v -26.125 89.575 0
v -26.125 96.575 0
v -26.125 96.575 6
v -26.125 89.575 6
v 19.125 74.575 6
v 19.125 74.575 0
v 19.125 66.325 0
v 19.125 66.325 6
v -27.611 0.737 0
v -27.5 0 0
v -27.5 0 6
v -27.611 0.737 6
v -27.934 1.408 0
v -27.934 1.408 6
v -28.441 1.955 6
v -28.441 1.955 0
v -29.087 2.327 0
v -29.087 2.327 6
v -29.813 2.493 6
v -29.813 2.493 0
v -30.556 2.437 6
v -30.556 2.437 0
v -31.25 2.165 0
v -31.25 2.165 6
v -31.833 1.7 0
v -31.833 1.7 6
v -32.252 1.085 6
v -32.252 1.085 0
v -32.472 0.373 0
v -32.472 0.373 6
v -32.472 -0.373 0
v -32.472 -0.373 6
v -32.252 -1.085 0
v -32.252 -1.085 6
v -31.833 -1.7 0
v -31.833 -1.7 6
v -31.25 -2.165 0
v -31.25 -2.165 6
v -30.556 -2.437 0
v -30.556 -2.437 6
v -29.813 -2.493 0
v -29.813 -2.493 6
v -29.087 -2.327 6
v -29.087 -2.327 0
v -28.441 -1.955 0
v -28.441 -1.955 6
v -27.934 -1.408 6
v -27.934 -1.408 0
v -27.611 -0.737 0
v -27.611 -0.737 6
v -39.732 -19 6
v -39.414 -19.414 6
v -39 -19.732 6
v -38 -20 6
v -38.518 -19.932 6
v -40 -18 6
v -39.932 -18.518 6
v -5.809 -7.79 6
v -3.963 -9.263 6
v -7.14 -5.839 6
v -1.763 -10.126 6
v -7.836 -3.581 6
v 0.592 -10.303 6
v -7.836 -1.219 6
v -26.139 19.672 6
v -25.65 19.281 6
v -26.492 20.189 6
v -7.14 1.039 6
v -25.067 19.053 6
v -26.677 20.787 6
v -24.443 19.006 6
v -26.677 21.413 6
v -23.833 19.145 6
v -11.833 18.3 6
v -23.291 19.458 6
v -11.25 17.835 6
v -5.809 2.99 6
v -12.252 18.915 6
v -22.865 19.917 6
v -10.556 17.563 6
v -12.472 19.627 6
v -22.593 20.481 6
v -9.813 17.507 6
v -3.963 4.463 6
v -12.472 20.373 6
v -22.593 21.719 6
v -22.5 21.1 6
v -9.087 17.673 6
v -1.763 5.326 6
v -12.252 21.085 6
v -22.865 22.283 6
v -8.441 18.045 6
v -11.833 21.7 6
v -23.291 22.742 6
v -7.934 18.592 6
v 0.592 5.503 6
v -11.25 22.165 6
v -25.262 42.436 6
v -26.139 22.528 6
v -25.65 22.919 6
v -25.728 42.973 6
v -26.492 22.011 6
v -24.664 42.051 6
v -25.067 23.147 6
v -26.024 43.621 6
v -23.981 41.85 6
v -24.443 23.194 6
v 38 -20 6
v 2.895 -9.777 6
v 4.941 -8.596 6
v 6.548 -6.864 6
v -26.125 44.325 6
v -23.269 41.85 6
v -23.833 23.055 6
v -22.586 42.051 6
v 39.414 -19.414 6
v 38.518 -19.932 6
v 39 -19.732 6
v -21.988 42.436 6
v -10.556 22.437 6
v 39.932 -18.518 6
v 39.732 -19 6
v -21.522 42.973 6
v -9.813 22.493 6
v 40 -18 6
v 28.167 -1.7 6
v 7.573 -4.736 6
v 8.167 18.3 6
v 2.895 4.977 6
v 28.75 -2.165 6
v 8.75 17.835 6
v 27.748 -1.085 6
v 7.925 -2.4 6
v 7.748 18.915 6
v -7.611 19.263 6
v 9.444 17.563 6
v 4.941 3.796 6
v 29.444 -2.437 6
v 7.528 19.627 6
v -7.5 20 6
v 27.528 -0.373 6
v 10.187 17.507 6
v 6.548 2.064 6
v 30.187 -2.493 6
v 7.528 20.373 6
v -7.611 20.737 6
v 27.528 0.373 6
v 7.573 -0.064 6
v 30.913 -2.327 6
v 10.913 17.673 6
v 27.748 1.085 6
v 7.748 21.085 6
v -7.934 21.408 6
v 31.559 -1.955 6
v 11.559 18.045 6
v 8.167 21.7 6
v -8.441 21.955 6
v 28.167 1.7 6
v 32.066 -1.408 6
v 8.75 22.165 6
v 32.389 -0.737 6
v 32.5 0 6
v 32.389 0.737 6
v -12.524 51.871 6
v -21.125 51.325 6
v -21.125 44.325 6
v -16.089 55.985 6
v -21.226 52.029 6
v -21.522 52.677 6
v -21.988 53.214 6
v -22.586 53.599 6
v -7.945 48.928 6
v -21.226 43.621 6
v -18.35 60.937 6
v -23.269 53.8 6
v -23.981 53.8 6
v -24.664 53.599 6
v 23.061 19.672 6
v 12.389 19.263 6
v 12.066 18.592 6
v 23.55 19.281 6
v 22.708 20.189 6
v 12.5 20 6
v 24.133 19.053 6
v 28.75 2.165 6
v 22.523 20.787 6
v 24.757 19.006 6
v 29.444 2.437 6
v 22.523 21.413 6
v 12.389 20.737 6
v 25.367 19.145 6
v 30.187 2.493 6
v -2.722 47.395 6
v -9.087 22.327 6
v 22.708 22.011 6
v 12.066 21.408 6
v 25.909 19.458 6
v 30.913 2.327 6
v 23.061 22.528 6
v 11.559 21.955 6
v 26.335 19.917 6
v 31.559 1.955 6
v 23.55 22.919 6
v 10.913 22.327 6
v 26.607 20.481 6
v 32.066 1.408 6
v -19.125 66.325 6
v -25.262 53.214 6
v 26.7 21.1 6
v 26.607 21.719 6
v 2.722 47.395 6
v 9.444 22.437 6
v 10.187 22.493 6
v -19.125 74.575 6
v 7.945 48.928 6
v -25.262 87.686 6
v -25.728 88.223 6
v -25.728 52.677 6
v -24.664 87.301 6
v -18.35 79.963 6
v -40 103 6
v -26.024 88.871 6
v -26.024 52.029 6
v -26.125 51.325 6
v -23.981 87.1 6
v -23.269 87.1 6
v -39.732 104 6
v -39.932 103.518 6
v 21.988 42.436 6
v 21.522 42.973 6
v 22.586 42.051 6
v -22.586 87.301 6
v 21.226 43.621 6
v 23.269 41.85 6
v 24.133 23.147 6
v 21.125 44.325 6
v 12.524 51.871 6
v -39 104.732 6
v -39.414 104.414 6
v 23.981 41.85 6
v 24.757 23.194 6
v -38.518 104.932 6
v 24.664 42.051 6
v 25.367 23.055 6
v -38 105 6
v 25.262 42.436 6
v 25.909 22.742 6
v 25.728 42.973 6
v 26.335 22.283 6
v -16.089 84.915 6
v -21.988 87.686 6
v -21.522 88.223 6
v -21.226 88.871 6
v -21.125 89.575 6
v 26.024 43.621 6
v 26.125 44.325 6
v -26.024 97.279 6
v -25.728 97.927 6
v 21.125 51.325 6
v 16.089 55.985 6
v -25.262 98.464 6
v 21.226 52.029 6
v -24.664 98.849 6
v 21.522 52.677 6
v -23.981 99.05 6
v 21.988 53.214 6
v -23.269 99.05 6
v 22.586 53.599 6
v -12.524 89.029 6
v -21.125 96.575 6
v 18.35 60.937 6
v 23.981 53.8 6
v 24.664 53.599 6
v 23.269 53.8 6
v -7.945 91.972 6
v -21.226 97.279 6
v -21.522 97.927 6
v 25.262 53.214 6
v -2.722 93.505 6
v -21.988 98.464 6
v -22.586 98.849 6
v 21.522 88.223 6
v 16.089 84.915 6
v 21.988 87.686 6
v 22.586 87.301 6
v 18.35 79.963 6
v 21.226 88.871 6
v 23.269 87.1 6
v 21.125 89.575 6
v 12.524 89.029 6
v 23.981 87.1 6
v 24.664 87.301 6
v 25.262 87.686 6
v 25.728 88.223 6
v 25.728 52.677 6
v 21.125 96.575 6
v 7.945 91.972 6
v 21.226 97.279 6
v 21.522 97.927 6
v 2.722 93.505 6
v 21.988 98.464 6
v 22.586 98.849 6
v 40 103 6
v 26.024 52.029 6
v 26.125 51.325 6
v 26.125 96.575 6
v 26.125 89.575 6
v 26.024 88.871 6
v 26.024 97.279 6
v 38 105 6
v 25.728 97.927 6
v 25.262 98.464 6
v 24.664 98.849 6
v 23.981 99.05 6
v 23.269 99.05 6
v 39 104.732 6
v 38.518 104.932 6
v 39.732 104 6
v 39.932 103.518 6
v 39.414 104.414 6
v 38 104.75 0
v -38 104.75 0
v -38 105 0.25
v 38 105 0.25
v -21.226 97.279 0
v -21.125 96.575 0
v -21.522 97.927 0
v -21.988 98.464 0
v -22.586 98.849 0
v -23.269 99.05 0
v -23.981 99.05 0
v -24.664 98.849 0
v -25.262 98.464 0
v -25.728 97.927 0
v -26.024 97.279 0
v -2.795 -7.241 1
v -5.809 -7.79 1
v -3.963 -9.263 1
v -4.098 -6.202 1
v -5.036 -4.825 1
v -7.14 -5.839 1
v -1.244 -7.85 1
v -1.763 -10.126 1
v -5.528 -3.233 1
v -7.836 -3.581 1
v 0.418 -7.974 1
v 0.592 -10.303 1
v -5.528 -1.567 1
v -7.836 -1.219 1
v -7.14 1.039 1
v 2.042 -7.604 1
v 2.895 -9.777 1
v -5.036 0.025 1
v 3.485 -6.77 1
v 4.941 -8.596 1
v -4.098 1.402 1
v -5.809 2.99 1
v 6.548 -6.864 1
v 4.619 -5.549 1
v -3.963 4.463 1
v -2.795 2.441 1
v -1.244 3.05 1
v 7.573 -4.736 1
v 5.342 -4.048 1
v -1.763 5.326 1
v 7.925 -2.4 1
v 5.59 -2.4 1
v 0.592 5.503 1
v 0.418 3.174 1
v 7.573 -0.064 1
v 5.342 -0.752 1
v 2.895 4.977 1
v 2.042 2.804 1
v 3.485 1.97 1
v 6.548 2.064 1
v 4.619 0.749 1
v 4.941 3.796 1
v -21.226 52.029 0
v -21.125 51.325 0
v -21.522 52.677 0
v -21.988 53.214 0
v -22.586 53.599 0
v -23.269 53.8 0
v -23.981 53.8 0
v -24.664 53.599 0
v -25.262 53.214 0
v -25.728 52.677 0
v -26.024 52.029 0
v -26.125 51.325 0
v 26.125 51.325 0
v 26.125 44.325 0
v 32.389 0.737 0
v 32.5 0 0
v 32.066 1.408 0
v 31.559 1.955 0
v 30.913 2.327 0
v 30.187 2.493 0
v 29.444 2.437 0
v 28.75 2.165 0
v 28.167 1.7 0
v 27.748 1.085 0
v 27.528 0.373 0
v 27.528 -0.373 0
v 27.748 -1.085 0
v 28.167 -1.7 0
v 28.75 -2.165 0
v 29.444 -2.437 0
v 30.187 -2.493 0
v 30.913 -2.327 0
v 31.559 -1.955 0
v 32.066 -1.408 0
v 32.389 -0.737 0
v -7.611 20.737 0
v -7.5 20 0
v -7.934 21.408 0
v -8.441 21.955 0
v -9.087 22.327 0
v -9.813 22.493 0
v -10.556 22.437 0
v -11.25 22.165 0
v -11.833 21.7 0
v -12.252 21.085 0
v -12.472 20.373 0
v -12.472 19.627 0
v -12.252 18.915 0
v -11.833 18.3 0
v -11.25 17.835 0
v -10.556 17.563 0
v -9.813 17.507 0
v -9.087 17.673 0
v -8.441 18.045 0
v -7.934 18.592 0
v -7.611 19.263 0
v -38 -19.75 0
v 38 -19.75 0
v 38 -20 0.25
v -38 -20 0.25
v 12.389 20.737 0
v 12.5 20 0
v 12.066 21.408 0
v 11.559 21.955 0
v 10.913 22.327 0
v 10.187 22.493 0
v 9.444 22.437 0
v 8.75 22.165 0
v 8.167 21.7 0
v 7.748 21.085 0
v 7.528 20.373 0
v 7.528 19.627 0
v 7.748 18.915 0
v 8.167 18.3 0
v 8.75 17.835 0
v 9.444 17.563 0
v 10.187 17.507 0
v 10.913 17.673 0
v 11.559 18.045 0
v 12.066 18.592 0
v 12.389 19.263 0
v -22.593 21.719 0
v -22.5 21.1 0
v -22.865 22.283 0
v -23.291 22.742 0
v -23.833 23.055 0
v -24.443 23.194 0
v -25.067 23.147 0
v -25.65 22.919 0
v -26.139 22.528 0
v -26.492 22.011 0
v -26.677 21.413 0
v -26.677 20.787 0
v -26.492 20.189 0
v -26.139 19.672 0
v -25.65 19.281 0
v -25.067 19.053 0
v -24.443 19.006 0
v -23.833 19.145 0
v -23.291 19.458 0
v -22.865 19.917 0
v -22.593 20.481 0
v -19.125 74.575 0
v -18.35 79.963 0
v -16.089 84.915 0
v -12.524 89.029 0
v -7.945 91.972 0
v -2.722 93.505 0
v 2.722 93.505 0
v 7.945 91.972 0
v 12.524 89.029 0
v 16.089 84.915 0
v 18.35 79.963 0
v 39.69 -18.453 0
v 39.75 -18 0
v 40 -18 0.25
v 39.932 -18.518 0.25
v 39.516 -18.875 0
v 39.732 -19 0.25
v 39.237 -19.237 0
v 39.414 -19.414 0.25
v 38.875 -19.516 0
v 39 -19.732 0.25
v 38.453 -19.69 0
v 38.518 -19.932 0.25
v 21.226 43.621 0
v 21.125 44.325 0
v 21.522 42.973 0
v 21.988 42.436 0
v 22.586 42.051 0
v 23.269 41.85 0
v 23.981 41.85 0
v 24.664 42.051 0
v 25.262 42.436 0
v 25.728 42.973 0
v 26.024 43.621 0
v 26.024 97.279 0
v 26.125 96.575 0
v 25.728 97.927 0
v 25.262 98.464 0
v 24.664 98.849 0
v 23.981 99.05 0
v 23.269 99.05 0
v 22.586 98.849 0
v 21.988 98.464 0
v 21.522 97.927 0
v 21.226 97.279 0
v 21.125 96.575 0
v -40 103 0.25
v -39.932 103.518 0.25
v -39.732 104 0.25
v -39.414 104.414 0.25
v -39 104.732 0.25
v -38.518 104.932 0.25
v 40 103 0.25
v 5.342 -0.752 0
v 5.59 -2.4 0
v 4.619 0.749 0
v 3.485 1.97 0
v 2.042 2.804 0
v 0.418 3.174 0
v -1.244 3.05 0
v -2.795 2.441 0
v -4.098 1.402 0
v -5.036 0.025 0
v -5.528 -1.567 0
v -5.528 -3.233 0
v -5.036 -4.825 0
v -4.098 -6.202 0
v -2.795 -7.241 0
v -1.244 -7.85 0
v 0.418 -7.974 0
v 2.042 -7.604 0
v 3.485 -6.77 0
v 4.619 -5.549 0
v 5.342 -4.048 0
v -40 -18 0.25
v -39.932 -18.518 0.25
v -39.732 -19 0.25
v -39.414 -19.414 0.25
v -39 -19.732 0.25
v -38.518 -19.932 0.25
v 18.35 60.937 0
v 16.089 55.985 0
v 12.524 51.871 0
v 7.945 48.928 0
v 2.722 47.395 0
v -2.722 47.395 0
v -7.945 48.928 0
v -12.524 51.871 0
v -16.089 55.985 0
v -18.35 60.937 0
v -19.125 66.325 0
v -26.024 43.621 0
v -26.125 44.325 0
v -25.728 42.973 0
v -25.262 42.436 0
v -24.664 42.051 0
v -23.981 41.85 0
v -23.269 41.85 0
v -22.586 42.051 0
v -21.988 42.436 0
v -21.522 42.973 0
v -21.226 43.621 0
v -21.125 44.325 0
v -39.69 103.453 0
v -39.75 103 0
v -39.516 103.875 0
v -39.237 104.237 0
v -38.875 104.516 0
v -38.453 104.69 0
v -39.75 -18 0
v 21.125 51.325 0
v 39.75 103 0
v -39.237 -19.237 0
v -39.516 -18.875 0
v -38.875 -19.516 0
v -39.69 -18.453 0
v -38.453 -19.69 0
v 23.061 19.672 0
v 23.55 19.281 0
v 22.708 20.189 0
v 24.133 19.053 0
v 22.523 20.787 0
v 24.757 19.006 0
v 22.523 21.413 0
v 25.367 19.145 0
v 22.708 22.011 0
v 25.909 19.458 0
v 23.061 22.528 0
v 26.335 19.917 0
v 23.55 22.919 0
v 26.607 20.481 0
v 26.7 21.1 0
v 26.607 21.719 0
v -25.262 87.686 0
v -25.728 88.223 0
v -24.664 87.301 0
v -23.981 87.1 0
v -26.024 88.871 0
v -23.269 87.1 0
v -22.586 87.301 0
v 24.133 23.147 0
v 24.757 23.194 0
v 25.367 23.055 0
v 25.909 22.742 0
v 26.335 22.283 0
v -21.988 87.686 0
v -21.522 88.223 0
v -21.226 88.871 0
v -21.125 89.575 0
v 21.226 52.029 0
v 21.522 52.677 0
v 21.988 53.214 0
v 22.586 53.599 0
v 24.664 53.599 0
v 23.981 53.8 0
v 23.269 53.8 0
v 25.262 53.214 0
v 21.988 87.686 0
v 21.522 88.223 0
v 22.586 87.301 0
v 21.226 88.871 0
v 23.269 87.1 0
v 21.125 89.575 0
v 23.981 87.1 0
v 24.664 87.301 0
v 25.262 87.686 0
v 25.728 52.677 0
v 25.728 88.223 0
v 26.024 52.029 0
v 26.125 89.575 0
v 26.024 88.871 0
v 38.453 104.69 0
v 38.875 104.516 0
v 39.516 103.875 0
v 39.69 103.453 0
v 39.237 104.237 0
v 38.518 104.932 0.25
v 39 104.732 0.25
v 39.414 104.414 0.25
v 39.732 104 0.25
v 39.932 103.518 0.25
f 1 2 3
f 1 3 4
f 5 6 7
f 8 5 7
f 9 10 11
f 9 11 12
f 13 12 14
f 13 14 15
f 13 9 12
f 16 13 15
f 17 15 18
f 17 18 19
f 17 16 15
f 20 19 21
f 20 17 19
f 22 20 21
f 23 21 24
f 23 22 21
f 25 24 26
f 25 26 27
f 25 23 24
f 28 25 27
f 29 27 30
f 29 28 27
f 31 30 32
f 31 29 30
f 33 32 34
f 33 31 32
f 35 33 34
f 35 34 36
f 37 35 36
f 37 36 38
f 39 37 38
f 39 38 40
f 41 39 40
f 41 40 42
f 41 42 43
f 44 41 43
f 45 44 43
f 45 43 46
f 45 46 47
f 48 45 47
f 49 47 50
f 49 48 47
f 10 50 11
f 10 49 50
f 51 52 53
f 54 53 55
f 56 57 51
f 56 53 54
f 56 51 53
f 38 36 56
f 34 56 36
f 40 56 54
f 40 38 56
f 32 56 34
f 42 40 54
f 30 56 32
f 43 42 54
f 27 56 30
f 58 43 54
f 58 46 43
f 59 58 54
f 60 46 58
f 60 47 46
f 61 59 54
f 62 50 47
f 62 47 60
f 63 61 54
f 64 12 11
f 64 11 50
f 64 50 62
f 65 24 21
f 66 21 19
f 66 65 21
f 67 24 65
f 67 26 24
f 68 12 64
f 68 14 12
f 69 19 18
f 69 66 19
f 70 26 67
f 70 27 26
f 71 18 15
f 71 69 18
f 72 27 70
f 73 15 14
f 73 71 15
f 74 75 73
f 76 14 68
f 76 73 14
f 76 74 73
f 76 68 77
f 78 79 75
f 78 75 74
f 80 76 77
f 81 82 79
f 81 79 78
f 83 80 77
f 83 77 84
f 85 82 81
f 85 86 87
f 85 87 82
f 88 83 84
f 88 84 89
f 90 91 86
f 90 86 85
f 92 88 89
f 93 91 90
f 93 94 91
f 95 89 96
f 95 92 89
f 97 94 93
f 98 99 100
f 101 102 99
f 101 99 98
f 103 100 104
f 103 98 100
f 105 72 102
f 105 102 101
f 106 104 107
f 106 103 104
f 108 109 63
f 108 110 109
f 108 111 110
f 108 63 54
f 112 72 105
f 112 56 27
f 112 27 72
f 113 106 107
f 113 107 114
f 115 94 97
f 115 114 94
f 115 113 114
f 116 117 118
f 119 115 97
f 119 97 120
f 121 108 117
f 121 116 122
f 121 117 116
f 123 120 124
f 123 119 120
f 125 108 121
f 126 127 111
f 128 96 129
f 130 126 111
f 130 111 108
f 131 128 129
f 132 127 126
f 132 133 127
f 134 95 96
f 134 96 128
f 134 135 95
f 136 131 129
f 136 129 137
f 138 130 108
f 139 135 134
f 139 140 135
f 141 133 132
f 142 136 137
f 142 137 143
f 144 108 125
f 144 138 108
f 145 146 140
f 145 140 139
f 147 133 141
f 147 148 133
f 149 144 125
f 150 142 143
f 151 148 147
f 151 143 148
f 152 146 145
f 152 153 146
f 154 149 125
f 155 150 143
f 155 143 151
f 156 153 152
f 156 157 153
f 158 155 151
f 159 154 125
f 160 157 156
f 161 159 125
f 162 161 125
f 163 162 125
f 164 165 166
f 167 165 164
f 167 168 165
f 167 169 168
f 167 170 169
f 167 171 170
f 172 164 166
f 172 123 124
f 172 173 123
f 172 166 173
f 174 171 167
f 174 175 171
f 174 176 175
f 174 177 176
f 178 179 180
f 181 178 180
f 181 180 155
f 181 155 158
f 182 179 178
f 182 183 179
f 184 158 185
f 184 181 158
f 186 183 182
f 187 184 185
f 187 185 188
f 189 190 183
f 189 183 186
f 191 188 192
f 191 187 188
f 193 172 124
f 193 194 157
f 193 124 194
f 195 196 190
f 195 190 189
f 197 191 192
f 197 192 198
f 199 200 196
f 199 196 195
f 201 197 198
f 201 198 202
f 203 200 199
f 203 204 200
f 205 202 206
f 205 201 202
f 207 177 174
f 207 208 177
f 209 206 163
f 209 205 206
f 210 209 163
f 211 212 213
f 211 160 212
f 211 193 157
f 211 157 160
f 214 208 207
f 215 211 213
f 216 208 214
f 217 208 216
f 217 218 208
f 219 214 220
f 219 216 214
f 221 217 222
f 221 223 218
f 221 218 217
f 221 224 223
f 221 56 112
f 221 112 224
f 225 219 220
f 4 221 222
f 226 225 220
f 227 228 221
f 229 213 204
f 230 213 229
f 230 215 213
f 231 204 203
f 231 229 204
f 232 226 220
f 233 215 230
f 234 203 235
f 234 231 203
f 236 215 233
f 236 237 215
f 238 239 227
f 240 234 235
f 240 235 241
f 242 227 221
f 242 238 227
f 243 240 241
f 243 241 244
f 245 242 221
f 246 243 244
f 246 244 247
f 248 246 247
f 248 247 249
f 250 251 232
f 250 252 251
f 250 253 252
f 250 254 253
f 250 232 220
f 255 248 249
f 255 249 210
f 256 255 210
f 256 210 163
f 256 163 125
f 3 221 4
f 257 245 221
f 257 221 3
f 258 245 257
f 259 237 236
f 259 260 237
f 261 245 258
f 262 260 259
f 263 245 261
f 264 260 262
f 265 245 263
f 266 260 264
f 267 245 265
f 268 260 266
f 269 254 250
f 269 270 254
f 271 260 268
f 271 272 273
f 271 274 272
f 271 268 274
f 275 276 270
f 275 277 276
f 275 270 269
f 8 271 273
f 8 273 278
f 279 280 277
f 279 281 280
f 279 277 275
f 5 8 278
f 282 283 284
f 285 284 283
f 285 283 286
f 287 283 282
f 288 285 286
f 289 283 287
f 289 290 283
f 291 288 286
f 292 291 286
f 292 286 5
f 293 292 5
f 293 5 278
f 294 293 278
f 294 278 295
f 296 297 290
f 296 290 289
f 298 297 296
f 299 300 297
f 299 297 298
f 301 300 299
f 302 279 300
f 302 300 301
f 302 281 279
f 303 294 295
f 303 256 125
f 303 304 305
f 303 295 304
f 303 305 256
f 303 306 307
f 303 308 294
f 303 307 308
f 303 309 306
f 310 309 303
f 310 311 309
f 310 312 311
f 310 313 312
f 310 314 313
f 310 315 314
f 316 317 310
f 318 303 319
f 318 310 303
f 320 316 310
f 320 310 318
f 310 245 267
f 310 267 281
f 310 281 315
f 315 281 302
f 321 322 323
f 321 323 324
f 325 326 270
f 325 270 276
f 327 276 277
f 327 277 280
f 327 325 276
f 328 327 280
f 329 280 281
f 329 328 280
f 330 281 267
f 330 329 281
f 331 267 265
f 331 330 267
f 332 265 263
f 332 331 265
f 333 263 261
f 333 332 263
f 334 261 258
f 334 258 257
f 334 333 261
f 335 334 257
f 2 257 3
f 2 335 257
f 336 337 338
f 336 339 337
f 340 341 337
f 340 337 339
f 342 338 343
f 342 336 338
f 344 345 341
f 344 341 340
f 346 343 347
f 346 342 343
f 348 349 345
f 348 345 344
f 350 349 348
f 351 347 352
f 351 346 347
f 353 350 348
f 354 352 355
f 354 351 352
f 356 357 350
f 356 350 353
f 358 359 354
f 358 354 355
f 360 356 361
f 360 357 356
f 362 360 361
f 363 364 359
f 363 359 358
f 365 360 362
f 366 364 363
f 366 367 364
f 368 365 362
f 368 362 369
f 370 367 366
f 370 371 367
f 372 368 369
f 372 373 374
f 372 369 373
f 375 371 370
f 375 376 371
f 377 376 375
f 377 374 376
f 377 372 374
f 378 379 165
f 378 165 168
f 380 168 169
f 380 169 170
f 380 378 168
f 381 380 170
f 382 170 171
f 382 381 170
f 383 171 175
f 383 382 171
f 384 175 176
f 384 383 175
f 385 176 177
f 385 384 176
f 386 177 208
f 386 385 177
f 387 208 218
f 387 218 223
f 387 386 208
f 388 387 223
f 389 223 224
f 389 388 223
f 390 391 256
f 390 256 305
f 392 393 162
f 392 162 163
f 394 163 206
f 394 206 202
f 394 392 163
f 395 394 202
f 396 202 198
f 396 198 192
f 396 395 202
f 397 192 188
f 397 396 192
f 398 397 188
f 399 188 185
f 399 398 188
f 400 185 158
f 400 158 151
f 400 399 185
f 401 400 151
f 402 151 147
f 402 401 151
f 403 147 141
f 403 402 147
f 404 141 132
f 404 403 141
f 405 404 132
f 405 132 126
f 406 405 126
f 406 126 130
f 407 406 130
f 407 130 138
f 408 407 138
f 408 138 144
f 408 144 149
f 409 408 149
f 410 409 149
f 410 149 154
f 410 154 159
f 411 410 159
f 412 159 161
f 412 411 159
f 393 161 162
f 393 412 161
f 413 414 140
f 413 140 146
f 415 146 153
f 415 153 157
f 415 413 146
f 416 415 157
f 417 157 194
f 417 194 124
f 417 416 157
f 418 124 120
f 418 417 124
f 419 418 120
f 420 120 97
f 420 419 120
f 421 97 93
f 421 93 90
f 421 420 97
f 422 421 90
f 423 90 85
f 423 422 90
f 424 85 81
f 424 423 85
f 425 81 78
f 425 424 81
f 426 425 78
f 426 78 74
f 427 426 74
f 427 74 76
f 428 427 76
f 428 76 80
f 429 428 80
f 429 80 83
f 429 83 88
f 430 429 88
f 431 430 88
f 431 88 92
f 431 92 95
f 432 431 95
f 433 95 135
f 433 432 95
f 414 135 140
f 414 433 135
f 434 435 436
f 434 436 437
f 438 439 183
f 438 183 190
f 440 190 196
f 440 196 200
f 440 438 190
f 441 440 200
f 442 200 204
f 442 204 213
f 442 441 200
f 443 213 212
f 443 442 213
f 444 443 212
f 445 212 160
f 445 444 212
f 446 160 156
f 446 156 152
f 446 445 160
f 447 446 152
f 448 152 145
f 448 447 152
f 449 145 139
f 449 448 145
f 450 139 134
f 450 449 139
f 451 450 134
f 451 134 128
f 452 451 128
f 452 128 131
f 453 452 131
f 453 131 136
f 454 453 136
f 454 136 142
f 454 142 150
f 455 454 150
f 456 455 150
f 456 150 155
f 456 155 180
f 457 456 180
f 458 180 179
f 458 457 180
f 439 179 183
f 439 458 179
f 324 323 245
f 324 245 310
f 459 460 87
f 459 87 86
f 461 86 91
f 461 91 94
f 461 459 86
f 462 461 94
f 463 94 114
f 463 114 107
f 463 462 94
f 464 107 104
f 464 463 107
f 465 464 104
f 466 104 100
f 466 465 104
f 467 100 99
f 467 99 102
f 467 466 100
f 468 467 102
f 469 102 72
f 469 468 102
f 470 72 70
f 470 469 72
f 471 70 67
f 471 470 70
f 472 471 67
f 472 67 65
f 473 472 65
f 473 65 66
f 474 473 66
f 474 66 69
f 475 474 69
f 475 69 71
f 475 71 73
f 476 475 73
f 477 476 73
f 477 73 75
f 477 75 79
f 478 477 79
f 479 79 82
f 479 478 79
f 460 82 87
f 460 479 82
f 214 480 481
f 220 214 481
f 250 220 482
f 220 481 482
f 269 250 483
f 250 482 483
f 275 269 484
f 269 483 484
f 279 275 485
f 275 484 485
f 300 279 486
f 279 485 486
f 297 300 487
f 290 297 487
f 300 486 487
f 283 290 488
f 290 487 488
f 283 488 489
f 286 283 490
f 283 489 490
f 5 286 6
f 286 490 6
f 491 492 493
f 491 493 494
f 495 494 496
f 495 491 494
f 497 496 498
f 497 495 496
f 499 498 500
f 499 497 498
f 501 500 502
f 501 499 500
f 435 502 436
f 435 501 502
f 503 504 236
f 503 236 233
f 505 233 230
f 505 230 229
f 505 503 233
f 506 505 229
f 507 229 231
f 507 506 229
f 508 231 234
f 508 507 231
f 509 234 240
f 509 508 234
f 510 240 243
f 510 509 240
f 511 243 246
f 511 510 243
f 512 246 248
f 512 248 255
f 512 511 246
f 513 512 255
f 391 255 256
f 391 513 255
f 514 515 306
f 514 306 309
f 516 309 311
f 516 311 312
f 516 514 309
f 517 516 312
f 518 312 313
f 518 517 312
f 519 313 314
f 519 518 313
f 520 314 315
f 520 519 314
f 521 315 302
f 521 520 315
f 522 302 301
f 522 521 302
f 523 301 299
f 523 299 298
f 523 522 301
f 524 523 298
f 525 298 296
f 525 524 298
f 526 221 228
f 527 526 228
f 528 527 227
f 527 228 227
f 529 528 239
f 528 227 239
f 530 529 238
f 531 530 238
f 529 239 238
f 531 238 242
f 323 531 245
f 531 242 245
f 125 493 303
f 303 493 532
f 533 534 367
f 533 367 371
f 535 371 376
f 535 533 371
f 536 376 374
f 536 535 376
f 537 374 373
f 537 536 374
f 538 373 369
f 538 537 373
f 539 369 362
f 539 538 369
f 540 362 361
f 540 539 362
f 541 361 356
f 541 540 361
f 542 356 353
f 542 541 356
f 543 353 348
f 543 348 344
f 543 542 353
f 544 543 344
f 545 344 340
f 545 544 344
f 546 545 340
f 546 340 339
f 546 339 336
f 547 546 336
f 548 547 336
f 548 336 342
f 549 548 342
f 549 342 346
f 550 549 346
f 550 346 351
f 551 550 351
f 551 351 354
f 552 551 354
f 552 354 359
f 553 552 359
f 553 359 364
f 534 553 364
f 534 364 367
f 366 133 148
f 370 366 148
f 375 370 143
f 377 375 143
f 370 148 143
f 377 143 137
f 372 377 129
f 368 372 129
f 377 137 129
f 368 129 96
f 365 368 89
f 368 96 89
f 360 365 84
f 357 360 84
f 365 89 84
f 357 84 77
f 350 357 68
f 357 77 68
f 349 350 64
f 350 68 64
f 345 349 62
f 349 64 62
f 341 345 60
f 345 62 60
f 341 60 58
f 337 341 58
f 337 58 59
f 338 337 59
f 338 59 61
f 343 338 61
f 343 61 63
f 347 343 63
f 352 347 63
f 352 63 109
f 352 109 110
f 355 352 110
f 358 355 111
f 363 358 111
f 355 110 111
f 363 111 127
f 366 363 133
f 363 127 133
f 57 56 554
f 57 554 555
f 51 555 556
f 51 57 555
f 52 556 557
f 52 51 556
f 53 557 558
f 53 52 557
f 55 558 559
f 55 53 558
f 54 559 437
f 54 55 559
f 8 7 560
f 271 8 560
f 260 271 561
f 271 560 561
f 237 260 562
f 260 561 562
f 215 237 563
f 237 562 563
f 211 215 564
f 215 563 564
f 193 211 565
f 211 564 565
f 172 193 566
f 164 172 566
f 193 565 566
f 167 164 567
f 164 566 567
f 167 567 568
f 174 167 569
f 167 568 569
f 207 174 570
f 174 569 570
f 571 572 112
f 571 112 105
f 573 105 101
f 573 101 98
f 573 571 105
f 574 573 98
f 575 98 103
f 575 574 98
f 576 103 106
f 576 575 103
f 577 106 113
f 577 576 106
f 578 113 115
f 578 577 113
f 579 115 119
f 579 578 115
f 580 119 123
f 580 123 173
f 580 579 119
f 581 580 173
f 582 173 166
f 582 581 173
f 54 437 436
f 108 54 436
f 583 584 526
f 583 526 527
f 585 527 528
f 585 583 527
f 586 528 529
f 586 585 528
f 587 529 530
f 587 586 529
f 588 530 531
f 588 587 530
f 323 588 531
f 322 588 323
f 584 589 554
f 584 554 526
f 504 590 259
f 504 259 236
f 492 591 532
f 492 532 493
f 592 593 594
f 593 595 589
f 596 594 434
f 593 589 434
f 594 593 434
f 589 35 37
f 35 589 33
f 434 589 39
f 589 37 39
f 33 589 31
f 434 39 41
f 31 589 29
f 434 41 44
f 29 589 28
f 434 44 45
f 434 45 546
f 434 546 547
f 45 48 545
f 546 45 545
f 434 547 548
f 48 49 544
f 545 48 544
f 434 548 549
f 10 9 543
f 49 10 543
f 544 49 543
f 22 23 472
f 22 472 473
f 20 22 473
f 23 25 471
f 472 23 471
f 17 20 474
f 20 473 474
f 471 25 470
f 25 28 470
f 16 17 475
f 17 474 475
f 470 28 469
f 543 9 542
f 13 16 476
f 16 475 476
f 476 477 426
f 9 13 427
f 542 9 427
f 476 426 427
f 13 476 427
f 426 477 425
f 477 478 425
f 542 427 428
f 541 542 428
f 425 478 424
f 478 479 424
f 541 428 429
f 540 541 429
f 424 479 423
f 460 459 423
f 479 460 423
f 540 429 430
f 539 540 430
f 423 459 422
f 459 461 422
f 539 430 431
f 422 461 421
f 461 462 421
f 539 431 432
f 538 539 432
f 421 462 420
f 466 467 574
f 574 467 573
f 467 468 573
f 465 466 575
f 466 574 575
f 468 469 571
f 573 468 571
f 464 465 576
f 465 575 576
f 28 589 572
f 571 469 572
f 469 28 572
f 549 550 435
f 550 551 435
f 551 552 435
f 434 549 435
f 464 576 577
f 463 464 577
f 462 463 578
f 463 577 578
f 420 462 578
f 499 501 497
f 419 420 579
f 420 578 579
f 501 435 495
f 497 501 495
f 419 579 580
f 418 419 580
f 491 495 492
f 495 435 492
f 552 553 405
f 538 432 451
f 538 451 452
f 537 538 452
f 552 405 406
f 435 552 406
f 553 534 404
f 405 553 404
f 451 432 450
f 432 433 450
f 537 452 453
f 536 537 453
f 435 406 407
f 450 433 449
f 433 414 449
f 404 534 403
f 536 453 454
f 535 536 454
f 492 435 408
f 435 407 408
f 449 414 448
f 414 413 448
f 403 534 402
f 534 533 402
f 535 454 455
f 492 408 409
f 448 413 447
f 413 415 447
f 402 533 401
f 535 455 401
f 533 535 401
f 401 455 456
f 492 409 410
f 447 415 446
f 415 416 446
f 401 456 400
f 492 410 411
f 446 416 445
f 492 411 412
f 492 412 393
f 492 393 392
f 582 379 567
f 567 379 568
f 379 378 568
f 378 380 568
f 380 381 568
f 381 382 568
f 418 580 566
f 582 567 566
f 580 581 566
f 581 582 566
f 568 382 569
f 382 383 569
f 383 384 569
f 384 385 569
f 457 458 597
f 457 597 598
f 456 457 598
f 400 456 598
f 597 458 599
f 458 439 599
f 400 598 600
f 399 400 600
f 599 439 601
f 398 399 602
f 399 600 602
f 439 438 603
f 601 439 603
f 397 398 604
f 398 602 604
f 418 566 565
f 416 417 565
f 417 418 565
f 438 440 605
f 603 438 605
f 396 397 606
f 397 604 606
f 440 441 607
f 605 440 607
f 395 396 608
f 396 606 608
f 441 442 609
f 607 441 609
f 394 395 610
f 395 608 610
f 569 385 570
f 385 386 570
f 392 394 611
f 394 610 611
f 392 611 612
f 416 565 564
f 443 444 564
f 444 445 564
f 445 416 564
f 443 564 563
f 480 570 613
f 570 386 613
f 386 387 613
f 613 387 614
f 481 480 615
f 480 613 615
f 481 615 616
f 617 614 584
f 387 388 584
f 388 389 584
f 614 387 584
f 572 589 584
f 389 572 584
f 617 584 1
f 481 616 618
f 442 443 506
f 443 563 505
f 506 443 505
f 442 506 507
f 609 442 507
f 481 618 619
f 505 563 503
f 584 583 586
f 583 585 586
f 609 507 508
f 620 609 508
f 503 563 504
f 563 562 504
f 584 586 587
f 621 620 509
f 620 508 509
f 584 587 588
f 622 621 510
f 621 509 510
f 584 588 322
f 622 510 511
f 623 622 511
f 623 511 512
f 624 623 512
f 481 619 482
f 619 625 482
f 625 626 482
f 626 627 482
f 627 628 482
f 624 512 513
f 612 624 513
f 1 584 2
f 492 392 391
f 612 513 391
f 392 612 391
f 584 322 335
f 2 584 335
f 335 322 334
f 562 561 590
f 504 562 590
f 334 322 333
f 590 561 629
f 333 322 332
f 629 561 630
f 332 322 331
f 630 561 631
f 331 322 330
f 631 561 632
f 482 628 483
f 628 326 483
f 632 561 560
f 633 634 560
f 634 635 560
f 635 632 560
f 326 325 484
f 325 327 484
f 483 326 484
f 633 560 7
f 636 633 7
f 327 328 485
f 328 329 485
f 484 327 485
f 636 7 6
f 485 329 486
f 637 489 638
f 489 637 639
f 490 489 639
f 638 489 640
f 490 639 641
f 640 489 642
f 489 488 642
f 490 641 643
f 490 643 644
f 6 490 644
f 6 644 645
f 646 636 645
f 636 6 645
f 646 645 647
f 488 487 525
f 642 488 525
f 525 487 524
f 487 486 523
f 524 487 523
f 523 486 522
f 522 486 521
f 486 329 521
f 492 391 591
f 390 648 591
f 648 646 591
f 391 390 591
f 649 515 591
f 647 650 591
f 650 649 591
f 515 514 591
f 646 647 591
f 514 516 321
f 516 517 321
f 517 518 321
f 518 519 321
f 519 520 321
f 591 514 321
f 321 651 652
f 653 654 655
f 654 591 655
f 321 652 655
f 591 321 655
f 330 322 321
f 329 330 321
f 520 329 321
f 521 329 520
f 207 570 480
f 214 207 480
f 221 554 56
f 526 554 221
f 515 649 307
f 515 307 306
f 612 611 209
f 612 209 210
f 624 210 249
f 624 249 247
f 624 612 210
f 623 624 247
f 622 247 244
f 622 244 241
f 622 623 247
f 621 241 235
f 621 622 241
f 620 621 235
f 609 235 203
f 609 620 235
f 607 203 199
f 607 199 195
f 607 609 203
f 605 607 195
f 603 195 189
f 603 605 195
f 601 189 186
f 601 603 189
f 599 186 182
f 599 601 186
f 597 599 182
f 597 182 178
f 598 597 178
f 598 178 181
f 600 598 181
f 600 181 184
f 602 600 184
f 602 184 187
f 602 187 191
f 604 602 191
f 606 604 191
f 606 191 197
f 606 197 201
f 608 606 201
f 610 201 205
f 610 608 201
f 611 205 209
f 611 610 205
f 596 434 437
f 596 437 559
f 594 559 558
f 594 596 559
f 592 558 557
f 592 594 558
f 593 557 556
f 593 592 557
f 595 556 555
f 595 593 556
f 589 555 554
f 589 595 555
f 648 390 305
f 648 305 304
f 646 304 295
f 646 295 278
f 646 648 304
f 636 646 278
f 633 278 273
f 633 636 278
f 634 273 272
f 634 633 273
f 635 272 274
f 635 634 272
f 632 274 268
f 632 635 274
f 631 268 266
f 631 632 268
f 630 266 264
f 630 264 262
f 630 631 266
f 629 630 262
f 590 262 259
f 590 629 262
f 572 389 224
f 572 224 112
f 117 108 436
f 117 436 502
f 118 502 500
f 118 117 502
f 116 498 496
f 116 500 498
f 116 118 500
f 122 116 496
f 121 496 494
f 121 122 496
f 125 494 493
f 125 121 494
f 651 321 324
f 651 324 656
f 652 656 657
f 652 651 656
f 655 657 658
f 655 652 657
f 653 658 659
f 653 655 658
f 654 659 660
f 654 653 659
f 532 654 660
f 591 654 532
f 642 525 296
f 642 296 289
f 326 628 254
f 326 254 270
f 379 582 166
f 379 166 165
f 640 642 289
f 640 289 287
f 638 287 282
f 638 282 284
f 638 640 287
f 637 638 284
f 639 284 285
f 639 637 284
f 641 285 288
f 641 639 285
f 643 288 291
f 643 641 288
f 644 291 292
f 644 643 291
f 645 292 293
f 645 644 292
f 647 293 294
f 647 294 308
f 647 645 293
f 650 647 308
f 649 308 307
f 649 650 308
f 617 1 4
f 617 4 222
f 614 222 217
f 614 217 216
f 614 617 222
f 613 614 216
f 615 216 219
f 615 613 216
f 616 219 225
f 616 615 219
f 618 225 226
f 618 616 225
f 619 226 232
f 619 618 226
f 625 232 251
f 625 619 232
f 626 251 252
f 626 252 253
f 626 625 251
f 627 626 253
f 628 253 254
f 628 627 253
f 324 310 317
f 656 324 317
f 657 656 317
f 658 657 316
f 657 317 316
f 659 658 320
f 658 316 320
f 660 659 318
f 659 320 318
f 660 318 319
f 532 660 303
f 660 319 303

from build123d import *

# Parameters (mm, degrees)
F0_W     = 80
F0_H     = 125
F0_R     = 2.5
F0_R_2   = 2.1
F0_R_3   = 5.59
F1_DEPTH = 6
F3_DEPTH = 6
F4_R     = 2
F5_SIZE  = 0.25
F6_R     = 7.925
F6_R_2   = 5.59
F7_DEPTH = 5


with BuildPart() as f1:
    # F0 (on Top) → F1 (new body)
    with BuildSketch(Plane.XY):
        with Locations((0, 42.5)):
            Rectangle(F0_W, F0_H)
        with Locations((-30, 0)):
            Circle(F0_R, mode=Mode.SUBTRACT)
        with Locations((-24.6, 21.1)):
            Circle(F0_R_2, mode=Mode.SUBTRACT)
        with Locations((-10, 20)):
            Circle(F0_R, mode=Mode.SUBTRACT)
        with Locations((0, -2.4)):
            Circle(F0_R_3, mode=Mode.SUBTRACT)
        with Locations((30, 0)):
            Circle(F0_R, mode=Mode.SUBTRACT)
        with Locations((10, 20)):
            Circle(F0_R, mode=Mode.SUBTRACT)
        with Locations((24.6, 21.1)):
            Circle(F0_R_2, mode=Mode.SUBTRACT)
        with BuildLine():
            ThreePointArc((-19.125, 74.575), (0, 93.7), (19.125, 74.575))
            Line((19.125, 74.575), (19.125, 66.325))
            ThreePointArc((19.125, 66.325), (0, 47.2), (-19.125, 66.325))
            Line((-19.125, 66.325), (-19.125, 74.575))
        make_face(mode=Mode.SUBTRACT)
    extrude(amount=F1_DEPTH)

    # F2 (on Top) → F3 (cut, through all)
    with BuildSketch(Plane.XY):
        with BuildLine():
            Line((-21.125, 89.575), (-21.125, 96.575))
            ThreePointArc((-21.125, 96.575), (-23.625, 99.075), (-26.125, 96.575))
            Line((-26.125, 96.575), (-26.125, 89.575))
            ThreePointArc((-26.125, 89.575), (-23.625, 87.075), (-21.125, 89.575))
        make_face()
        with BuildLine():
            Line((26.125, 89.575), (26.125, 96.575))
            ThreePointArc((26.125, 96.575), (23.625, 99.075), (21.125, 96.575))
            Line((21.125, 96.575), (21.125, 89.575))
            ThreePointArc((21.125, 89.575), (23.625, 87.075), (26.125, 89.575))
        make_face()
        with BuildLine():
            ThreePointArc((21.125, 44.325), (23.625, 41.825), (26.125, 44.325))
            Line((26.125, 44.325), (26.125, 51.325))
            ThreePointArc((26.125, 51.325), (23.625, 53.825), (21.125, 51.325))
            Line((21.125, 51.325), (21.125, 44.325))
        make_face()
        with BuildLine():
            ThreePointArc((-21.125, 51.325), (-23.625, 53.825), (-26.125, 51.325))
            Line((-26.125, 51.325), (-26.125, 44.325))
            ThreePointArc((-26.125, 44.325), (-23.625, 41.825), (-21.125, 44.325))
            Line((-21.125, 44.325), (-21.125, 51.325))
        make_face()
    extrude(amount=F3_DEPTH, mode=Mode.SUBTRACT)

    # F4
    f4_edges = [f1.edges().sort_by_distance(p)[0] for p in [
        (40, -20, 3),
        (-40, -20, 3),
        (40, 105, 3),
        (-40, 105, 3),
    ]]
    fillet(f4_edges, radius=F4_R)

    # F5
    f5_edges = [f1.edges().sort_by_distance(p)[0] for p in [
        (-40, 42.5, 0),
        (-39.414214, 104.414214, 0),
        (0, 105, 0),
        (39.414214, 104.414214, 0),
        (40, 42.5, 0),
        (39.414214, -19.414214, 0),
        (0, -20, 0),
        (-39.414214, -19.414214, 0),
    ]]
    chamfer(f5_edges, length=F5_SIZE)

    # F6 (on face) → F7 (cut)
    with BuildSketch(Plane.XY.offset(6)):
        with Locations((0, -2.4)):
            Circle(F6_R)
        with Locations((0, -2.4)):
            Circle(F6_R_2, mode=Mode.SUBTRACT)
    extrude(amount=-F7_DEPTH, mode=Mode.SUBTRACT)


solid = f1.part
